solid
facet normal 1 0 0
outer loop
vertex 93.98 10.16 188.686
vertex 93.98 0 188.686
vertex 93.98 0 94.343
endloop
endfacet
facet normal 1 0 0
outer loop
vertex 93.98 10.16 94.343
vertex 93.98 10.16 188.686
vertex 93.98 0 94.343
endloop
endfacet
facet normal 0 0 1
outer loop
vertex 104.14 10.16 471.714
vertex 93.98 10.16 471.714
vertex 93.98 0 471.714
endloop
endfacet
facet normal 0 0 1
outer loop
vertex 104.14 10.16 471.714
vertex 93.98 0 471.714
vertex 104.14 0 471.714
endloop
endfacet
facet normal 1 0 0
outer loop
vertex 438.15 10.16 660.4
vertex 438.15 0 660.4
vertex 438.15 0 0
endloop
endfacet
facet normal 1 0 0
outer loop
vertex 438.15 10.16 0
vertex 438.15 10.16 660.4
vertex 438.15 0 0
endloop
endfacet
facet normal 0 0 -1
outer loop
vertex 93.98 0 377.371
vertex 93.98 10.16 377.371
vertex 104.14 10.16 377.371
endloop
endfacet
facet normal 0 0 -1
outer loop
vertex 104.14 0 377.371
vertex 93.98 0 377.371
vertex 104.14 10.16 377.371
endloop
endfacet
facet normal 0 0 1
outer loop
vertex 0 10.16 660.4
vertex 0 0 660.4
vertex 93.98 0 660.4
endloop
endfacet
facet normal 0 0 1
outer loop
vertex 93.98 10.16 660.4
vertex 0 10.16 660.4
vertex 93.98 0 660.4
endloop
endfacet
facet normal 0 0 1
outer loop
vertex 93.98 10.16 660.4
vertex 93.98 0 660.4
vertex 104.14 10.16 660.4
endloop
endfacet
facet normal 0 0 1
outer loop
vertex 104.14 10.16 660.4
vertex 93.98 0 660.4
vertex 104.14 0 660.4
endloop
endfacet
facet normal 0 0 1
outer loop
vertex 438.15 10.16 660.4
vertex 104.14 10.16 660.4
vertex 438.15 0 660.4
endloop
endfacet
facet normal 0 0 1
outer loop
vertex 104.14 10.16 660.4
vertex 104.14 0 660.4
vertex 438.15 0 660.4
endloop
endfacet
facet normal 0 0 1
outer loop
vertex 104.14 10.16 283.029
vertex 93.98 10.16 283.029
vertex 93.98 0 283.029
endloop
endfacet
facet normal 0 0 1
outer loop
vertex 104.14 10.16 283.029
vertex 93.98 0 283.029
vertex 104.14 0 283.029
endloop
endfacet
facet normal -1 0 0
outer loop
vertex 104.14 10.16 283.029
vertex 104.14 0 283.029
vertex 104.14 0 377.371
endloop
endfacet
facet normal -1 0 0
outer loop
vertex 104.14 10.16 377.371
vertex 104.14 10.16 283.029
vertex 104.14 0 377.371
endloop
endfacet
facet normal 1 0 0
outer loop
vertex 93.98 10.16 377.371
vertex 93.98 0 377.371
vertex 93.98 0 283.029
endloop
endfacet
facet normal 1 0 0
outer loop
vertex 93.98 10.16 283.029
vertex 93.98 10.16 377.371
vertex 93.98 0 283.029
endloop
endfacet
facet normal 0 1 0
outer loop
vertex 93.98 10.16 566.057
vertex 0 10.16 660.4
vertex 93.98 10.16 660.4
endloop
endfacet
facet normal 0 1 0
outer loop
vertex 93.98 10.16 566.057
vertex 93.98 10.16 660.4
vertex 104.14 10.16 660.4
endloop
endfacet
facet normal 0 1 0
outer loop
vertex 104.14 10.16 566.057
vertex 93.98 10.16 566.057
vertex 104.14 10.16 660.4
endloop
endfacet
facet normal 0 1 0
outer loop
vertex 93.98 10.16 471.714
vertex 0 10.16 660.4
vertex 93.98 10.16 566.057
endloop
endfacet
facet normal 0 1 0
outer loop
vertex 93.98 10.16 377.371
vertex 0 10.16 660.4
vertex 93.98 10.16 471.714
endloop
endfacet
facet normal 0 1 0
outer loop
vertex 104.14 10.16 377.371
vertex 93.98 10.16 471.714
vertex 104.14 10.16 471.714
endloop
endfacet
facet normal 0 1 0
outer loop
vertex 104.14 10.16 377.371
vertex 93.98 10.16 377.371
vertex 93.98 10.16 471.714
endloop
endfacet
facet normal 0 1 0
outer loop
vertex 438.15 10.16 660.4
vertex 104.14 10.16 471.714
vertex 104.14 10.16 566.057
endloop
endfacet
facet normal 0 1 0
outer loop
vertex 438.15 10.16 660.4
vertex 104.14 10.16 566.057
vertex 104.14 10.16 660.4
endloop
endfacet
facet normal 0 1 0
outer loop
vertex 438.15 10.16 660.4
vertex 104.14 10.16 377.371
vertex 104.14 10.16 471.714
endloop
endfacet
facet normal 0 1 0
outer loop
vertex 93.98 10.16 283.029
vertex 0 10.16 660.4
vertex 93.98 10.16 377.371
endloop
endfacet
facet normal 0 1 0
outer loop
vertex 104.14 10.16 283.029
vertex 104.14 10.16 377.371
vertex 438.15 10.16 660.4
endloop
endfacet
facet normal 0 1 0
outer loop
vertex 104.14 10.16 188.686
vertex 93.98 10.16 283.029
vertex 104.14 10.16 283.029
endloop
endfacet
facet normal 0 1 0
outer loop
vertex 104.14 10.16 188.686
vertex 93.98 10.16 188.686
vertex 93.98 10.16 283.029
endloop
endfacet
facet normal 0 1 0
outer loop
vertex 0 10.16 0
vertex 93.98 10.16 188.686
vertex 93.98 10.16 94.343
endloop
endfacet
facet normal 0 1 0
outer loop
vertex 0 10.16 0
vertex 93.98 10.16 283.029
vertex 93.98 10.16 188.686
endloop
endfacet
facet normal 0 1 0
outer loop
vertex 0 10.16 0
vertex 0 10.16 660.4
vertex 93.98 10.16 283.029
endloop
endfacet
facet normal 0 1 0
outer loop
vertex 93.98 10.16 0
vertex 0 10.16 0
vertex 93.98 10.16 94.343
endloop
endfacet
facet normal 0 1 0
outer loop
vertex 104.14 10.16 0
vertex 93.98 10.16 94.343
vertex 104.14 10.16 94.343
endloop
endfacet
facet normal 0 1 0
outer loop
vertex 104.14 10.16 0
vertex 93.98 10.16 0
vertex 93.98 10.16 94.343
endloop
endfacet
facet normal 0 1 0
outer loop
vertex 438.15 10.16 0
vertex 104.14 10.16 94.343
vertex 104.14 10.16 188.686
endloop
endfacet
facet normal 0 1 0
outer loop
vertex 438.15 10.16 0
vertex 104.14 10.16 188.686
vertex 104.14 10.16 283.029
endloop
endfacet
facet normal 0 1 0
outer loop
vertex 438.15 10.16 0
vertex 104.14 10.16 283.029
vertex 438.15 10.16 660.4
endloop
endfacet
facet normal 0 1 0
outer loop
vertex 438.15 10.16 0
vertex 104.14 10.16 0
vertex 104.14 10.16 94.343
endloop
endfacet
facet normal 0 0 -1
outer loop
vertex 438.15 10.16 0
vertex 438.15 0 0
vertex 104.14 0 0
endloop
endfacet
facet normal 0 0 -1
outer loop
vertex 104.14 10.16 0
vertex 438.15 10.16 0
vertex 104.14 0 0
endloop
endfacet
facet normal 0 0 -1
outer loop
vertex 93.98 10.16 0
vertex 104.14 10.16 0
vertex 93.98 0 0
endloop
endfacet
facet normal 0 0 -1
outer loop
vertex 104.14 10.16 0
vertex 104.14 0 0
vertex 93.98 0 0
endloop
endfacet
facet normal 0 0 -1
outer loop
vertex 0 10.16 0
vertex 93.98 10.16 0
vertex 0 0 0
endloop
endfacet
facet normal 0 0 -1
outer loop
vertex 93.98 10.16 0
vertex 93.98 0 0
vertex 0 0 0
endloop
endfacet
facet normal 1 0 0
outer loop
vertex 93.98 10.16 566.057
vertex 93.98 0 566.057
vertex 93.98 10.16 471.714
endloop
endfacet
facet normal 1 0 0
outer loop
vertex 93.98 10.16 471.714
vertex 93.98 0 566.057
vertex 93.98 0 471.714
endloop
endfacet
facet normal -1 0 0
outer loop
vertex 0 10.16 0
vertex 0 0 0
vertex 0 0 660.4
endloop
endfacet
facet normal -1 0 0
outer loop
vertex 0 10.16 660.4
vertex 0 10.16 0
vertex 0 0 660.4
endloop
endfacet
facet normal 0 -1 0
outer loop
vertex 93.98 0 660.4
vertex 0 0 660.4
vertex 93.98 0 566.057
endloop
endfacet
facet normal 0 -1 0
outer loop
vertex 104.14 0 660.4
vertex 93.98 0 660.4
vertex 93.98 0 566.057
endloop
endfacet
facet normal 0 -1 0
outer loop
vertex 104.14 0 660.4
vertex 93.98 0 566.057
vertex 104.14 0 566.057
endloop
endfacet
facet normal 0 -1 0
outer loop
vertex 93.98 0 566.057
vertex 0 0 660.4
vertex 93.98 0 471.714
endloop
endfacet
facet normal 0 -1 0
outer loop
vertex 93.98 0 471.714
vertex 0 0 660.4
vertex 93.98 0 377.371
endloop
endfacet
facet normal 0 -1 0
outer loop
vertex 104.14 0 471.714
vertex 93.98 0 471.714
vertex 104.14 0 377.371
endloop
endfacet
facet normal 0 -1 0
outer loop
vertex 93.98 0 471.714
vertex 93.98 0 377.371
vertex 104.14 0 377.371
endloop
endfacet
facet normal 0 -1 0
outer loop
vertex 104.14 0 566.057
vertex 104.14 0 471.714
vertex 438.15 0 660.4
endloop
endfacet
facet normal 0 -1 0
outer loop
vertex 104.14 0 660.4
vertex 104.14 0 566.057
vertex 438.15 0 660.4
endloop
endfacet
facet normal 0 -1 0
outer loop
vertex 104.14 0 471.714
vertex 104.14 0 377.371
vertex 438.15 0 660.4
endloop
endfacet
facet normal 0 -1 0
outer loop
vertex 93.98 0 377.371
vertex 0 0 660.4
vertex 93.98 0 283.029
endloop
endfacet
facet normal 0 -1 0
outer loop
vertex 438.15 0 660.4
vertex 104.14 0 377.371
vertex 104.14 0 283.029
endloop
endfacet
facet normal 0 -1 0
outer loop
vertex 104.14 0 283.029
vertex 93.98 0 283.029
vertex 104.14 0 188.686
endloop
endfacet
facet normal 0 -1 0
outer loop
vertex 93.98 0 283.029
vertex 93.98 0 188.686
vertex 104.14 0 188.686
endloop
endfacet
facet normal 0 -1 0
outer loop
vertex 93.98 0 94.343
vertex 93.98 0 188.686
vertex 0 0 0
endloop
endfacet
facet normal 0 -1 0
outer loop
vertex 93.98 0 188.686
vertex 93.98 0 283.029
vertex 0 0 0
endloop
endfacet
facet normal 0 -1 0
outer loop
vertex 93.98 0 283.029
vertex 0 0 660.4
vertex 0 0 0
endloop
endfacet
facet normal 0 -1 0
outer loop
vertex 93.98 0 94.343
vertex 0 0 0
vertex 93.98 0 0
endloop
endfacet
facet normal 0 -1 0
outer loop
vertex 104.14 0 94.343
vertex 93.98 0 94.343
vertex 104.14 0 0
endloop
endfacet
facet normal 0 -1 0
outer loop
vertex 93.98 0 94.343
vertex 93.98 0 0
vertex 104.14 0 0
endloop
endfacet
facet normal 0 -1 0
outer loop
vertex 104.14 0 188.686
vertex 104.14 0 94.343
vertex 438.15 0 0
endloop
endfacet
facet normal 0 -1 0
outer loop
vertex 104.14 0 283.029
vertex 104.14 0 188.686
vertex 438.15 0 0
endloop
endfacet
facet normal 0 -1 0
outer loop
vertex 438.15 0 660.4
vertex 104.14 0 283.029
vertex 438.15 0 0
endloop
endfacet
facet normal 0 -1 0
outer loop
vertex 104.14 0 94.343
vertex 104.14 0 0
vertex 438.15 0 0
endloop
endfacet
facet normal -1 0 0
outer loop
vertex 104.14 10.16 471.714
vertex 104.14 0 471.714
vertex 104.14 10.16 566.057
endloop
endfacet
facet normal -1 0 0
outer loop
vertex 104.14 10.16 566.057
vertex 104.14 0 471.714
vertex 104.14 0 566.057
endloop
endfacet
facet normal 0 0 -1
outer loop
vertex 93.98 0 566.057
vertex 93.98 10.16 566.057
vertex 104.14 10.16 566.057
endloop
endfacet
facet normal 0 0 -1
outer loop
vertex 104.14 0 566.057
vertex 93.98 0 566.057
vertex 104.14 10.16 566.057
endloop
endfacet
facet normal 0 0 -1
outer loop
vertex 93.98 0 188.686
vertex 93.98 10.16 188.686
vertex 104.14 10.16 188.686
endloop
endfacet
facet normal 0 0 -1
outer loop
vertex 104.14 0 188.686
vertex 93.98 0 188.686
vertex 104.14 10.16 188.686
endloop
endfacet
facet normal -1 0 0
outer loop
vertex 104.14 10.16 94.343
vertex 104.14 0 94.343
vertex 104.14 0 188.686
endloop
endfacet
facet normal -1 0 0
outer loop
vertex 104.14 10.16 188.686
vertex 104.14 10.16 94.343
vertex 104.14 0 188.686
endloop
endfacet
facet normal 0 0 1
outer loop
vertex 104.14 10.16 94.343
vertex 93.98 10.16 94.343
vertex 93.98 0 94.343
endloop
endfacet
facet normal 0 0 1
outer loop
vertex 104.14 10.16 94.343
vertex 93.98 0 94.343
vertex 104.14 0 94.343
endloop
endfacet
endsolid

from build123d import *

# Parameters (mm, degrees)
SKETCH1_W           = 10.16
SKETCH1_H           = 94.342857143
BOSS_EXTRUDE1_DEPTH = 10.16


with BuildPart() as part:
    # Sketch1 → Boss-Extrude1 (new body)
    with BuildSketch(Plane(origin=(0, 0, 0), x_dir=(1, 0, 0), z_dir=(0, 1, 0))):
        Polygon((93.98, 0), (0, 0), (0, -660.4), (93.98, -660.4), (93.98, -566.057142857), (93.98, -471.714285714), (93.98, -377.371428571), (93.98, -283.028571429), (93.98, -188.685714286), (93.98, -94.342857143), align=None)
        Polygon((438.15, 0), (104.14, 0), (104.14, -94.342857143), (104.14, -188.685714286), (104.14, -283.028571429), (104.14, -377.371428571), (104.14, -471.714285714), (104.14, -566.057142857), (104.14, -660.4), (438.15, -660.4), align=None)
        with Locations((99.06, -47.171428572)):
            Rectangle(SKETCH1_W, SKETCH1_H)
        with Locations((99.06, -235.857142858)):
            Rectangle(SKETCH1_W, SKETCH1_H)
        with Locations((99.06, -424.542857142)):
            Rectangle(SKETCH1_W, SKETCH1_H)
        with Locations((99.06, -613.228571429)):
            Rectangle(SKETCH1_W, SKETCH1_H)
    extrude(amount=BOSS_EXTRUDE1_DEPTH)


solid = part.part
